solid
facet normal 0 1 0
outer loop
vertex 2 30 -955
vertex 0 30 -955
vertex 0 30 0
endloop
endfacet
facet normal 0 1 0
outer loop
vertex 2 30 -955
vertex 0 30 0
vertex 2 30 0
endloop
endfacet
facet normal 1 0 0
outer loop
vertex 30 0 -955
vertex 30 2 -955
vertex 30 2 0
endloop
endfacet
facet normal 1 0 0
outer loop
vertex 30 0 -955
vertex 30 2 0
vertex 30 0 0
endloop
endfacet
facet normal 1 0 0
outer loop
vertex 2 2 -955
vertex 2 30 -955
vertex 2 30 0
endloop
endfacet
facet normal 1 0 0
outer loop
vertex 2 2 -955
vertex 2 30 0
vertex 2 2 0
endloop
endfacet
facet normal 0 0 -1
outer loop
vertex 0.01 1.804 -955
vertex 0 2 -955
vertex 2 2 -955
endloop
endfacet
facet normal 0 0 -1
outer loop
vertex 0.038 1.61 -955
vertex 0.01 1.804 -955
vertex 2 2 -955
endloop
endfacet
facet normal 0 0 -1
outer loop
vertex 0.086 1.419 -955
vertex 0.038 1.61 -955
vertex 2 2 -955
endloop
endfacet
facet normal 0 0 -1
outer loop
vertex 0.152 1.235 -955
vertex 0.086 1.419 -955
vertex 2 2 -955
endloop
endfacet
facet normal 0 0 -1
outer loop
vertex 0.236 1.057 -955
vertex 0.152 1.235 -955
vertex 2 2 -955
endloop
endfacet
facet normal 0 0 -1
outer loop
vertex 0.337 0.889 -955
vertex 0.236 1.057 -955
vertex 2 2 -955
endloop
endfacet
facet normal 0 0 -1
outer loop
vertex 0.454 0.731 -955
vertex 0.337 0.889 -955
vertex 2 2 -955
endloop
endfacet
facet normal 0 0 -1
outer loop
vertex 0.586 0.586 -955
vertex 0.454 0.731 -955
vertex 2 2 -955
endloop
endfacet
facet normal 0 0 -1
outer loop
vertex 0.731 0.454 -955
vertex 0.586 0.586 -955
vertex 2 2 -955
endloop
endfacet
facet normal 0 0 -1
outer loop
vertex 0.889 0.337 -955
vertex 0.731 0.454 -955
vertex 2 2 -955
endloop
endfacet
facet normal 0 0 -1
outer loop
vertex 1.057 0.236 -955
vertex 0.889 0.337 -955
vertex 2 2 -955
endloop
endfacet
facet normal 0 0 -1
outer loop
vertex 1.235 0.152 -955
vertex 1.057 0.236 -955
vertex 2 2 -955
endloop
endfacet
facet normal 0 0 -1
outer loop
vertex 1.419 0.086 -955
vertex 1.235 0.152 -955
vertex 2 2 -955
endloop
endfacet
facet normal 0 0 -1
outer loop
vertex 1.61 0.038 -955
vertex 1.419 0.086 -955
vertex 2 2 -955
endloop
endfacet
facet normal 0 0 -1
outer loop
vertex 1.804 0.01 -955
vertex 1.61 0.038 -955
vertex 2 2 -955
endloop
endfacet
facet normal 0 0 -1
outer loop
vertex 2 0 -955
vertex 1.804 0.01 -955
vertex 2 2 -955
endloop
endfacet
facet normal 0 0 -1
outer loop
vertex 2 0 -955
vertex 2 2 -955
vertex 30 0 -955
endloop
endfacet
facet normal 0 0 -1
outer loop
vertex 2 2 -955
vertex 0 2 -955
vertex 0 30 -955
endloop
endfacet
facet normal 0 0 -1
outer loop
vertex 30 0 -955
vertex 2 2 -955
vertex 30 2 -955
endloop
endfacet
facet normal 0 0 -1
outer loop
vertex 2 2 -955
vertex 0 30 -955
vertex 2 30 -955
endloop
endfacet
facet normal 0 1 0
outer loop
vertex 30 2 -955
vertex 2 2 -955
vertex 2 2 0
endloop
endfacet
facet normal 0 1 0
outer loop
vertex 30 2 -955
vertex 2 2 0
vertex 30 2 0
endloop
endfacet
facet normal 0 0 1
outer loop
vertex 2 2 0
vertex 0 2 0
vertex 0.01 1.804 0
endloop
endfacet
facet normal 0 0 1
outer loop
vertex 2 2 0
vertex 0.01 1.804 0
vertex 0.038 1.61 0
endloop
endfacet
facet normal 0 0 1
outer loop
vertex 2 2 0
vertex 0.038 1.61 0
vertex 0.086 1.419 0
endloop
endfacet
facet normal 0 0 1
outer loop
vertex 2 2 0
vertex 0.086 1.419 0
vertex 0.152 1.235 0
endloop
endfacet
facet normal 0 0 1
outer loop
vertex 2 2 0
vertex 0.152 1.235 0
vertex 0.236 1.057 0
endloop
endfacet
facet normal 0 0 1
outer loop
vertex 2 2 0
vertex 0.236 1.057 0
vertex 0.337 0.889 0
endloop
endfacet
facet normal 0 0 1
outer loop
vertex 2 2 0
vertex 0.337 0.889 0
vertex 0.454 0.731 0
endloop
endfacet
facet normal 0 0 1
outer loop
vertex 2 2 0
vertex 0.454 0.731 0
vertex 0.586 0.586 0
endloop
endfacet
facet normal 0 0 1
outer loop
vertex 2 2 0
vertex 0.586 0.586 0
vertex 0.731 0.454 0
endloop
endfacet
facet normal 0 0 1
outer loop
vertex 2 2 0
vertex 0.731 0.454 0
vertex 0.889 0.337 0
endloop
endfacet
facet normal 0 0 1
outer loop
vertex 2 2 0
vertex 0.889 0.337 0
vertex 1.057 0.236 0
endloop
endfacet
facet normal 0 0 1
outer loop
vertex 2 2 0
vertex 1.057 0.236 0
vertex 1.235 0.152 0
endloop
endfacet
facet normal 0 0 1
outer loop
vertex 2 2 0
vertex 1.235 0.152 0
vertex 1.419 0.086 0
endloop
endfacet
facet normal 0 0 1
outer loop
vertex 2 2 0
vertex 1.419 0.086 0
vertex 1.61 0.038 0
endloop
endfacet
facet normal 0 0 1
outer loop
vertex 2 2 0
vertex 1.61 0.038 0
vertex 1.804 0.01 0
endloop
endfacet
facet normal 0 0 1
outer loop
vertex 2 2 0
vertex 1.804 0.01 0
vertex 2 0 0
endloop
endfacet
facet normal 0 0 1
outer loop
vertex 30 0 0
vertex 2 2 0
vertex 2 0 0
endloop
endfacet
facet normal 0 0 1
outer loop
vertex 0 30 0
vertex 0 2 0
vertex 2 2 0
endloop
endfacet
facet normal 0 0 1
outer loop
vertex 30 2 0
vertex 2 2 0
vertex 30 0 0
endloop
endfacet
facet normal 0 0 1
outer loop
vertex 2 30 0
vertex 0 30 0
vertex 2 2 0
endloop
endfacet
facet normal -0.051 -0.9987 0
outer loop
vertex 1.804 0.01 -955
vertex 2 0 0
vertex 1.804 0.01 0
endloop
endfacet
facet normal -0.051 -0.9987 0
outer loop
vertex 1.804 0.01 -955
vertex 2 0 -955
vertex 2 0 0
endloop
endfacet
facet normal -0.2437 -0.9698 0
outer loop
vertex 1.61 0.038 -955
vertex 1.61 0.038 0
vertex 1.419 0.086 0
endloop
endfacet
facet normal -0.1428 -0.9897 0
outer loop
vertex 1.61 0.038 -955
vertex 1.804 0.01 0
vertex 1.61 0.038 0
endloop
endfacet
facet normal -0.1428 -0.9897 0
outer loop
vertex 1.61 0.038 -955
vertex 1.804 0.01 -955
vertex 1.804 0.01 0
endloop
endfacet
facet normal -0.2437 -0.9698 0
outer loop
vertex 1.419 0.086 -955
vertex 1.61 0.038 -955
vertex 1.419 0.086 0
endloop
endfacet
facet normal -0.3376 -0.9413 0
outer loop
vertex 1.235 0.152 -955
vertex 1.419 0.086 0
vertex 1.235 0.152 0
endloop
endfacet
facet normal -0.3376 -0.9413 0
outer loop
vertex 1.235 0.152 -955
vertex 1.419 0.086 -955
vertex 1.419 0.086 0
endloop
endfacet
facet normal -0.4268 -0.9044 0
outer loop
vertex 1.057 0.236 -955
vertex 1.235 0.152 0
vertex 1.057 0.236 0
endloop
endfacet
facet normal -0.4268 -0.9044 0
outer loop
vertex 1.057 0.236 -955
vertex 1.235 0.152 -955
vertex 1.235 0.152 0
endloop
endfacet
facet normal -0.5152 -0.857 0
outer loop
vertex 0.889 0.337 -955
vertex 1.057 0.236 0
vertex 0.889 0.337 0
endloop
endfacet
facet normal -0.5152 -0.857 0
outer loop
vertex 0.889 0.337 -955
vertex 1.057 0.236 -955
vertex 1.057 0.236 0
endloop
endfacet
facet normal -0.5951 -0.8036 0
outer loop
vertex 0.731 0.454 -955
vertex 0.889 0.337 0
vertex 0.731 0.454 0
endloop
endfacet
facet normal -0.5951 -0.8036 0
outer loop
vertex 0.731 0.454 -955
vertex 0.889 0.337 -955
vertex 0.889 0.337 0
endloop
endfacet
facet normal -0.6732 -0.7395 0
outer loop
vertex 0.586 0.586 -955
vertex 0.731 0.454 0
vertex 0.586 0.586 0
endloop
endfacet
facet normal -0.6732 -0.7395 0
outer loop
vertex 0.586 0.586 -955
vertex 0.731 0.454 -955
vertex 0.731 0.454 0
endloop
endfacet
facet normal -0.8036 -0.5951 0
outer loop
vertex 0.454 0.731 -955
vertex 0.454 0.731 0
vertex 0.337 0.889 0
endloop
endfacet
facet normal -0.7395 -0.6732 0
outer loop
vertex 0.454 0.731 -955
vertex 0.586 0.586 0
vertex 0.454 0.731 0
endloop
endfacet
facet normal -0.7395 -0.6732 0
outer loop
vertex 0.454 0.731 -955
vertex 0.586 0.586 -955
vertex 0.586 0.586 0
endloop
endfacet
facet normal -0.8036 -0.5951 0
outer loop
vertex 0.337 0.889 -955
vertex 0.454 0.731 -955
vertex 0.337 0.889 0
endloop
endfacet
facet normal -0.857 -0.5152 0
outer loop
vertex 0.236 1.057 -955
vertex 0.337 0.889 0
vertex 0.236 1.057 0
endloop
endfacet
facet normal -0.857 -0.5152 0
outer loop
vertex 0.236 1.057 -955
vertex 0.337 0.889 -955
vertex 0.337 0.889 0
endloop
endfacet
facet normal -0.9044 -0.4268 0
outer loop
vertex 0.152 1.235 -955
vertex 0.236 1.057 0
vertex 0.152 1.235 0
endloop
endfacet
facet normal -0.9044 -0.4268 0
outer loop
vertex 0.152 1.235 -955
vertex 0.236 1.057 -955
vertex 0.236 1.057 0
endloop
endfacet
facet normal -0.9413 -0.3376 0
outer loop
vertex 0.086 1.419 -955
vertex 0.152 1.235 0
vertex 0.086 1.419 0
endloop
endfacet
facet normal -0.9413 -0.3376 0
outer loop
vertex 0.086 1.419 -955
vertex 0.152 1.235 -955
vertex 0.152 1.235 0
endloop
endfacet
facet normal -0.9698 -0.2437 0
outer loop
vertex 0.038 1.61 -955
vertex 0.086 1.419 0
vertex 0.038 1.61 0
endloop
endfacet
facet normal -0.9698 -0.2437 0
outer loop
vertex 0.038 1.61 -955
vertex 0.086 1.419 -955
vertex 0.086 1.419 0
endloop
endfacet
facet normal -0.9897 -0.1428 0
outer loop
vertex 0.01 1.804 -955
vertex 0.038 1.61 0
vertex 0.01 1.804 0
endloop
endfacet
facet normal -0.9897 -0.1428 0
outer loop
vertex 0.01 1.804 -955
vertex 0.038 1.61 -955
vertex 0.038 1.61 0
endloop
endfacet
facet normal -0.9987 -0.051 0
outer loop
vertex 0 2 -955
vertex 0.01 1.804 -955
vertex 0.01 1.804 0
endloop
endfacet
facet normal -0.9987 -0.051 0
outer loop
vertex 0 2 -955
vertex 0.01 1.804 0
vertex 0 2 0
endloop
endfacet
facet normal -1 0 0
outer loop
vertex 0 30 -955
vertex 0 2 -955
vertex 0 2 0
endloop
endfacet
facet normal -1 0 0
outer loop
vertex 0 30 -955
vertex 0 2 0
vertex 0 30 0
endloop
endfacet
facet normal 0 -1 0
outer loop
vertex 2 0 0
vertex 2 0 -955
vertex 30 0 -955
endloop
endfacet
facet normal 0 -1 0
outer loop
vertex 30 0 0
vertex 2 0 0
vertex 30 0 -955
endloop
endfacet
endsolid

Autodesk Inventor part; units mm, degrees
ref_plane "YZ Plane" through (0, 0, 0) normal (1, 0, 0) x (0, 1, 0)
sketch "Sketch1" plane through (0, 0, 0) normal (0, 0, 1) x (1, 0, 0)
  line L0 (0, 0) -> (0, 30)
  line L1 (0, 0) -> (30, 0)
  line L2 (2, 30) -> (2, 2)
  line L3 (2, 2) -> (30, 2)
  line L4 (0, 30) -> (2, 30)
  line L5 (30, 2) -> (30, 0)
  dimension "d7" = 30
  dimension "d8" = 30
  dimension "d9" = 2
extrude "Extrusion1" add sketch "Sketch1" against normal blind 955
ref_plane "Work Plane1" through (2, 30, 0) normal (-0.7071, -0.7071, 0) x (0, 0, -1)
ref_plane "Work Plane2" through (0, 30, 0) normal (-0.7071, 0.7071, 0) x (0, 0, -1)
ref_plane "Work Plane3" through (30, 0, 0) normal (-0.7071, 0.7071, 0) x (0, 0, -1)
fillet "Fillet1" radius 2 1 edges at (0, 0, -477.5)
ref_plane "Work Plane4" through (15.0001, 14.9999, 0) normal (-0.7071, 0.7071, 0) x (0, 0, -1)
properties part number "Angulo en V"
